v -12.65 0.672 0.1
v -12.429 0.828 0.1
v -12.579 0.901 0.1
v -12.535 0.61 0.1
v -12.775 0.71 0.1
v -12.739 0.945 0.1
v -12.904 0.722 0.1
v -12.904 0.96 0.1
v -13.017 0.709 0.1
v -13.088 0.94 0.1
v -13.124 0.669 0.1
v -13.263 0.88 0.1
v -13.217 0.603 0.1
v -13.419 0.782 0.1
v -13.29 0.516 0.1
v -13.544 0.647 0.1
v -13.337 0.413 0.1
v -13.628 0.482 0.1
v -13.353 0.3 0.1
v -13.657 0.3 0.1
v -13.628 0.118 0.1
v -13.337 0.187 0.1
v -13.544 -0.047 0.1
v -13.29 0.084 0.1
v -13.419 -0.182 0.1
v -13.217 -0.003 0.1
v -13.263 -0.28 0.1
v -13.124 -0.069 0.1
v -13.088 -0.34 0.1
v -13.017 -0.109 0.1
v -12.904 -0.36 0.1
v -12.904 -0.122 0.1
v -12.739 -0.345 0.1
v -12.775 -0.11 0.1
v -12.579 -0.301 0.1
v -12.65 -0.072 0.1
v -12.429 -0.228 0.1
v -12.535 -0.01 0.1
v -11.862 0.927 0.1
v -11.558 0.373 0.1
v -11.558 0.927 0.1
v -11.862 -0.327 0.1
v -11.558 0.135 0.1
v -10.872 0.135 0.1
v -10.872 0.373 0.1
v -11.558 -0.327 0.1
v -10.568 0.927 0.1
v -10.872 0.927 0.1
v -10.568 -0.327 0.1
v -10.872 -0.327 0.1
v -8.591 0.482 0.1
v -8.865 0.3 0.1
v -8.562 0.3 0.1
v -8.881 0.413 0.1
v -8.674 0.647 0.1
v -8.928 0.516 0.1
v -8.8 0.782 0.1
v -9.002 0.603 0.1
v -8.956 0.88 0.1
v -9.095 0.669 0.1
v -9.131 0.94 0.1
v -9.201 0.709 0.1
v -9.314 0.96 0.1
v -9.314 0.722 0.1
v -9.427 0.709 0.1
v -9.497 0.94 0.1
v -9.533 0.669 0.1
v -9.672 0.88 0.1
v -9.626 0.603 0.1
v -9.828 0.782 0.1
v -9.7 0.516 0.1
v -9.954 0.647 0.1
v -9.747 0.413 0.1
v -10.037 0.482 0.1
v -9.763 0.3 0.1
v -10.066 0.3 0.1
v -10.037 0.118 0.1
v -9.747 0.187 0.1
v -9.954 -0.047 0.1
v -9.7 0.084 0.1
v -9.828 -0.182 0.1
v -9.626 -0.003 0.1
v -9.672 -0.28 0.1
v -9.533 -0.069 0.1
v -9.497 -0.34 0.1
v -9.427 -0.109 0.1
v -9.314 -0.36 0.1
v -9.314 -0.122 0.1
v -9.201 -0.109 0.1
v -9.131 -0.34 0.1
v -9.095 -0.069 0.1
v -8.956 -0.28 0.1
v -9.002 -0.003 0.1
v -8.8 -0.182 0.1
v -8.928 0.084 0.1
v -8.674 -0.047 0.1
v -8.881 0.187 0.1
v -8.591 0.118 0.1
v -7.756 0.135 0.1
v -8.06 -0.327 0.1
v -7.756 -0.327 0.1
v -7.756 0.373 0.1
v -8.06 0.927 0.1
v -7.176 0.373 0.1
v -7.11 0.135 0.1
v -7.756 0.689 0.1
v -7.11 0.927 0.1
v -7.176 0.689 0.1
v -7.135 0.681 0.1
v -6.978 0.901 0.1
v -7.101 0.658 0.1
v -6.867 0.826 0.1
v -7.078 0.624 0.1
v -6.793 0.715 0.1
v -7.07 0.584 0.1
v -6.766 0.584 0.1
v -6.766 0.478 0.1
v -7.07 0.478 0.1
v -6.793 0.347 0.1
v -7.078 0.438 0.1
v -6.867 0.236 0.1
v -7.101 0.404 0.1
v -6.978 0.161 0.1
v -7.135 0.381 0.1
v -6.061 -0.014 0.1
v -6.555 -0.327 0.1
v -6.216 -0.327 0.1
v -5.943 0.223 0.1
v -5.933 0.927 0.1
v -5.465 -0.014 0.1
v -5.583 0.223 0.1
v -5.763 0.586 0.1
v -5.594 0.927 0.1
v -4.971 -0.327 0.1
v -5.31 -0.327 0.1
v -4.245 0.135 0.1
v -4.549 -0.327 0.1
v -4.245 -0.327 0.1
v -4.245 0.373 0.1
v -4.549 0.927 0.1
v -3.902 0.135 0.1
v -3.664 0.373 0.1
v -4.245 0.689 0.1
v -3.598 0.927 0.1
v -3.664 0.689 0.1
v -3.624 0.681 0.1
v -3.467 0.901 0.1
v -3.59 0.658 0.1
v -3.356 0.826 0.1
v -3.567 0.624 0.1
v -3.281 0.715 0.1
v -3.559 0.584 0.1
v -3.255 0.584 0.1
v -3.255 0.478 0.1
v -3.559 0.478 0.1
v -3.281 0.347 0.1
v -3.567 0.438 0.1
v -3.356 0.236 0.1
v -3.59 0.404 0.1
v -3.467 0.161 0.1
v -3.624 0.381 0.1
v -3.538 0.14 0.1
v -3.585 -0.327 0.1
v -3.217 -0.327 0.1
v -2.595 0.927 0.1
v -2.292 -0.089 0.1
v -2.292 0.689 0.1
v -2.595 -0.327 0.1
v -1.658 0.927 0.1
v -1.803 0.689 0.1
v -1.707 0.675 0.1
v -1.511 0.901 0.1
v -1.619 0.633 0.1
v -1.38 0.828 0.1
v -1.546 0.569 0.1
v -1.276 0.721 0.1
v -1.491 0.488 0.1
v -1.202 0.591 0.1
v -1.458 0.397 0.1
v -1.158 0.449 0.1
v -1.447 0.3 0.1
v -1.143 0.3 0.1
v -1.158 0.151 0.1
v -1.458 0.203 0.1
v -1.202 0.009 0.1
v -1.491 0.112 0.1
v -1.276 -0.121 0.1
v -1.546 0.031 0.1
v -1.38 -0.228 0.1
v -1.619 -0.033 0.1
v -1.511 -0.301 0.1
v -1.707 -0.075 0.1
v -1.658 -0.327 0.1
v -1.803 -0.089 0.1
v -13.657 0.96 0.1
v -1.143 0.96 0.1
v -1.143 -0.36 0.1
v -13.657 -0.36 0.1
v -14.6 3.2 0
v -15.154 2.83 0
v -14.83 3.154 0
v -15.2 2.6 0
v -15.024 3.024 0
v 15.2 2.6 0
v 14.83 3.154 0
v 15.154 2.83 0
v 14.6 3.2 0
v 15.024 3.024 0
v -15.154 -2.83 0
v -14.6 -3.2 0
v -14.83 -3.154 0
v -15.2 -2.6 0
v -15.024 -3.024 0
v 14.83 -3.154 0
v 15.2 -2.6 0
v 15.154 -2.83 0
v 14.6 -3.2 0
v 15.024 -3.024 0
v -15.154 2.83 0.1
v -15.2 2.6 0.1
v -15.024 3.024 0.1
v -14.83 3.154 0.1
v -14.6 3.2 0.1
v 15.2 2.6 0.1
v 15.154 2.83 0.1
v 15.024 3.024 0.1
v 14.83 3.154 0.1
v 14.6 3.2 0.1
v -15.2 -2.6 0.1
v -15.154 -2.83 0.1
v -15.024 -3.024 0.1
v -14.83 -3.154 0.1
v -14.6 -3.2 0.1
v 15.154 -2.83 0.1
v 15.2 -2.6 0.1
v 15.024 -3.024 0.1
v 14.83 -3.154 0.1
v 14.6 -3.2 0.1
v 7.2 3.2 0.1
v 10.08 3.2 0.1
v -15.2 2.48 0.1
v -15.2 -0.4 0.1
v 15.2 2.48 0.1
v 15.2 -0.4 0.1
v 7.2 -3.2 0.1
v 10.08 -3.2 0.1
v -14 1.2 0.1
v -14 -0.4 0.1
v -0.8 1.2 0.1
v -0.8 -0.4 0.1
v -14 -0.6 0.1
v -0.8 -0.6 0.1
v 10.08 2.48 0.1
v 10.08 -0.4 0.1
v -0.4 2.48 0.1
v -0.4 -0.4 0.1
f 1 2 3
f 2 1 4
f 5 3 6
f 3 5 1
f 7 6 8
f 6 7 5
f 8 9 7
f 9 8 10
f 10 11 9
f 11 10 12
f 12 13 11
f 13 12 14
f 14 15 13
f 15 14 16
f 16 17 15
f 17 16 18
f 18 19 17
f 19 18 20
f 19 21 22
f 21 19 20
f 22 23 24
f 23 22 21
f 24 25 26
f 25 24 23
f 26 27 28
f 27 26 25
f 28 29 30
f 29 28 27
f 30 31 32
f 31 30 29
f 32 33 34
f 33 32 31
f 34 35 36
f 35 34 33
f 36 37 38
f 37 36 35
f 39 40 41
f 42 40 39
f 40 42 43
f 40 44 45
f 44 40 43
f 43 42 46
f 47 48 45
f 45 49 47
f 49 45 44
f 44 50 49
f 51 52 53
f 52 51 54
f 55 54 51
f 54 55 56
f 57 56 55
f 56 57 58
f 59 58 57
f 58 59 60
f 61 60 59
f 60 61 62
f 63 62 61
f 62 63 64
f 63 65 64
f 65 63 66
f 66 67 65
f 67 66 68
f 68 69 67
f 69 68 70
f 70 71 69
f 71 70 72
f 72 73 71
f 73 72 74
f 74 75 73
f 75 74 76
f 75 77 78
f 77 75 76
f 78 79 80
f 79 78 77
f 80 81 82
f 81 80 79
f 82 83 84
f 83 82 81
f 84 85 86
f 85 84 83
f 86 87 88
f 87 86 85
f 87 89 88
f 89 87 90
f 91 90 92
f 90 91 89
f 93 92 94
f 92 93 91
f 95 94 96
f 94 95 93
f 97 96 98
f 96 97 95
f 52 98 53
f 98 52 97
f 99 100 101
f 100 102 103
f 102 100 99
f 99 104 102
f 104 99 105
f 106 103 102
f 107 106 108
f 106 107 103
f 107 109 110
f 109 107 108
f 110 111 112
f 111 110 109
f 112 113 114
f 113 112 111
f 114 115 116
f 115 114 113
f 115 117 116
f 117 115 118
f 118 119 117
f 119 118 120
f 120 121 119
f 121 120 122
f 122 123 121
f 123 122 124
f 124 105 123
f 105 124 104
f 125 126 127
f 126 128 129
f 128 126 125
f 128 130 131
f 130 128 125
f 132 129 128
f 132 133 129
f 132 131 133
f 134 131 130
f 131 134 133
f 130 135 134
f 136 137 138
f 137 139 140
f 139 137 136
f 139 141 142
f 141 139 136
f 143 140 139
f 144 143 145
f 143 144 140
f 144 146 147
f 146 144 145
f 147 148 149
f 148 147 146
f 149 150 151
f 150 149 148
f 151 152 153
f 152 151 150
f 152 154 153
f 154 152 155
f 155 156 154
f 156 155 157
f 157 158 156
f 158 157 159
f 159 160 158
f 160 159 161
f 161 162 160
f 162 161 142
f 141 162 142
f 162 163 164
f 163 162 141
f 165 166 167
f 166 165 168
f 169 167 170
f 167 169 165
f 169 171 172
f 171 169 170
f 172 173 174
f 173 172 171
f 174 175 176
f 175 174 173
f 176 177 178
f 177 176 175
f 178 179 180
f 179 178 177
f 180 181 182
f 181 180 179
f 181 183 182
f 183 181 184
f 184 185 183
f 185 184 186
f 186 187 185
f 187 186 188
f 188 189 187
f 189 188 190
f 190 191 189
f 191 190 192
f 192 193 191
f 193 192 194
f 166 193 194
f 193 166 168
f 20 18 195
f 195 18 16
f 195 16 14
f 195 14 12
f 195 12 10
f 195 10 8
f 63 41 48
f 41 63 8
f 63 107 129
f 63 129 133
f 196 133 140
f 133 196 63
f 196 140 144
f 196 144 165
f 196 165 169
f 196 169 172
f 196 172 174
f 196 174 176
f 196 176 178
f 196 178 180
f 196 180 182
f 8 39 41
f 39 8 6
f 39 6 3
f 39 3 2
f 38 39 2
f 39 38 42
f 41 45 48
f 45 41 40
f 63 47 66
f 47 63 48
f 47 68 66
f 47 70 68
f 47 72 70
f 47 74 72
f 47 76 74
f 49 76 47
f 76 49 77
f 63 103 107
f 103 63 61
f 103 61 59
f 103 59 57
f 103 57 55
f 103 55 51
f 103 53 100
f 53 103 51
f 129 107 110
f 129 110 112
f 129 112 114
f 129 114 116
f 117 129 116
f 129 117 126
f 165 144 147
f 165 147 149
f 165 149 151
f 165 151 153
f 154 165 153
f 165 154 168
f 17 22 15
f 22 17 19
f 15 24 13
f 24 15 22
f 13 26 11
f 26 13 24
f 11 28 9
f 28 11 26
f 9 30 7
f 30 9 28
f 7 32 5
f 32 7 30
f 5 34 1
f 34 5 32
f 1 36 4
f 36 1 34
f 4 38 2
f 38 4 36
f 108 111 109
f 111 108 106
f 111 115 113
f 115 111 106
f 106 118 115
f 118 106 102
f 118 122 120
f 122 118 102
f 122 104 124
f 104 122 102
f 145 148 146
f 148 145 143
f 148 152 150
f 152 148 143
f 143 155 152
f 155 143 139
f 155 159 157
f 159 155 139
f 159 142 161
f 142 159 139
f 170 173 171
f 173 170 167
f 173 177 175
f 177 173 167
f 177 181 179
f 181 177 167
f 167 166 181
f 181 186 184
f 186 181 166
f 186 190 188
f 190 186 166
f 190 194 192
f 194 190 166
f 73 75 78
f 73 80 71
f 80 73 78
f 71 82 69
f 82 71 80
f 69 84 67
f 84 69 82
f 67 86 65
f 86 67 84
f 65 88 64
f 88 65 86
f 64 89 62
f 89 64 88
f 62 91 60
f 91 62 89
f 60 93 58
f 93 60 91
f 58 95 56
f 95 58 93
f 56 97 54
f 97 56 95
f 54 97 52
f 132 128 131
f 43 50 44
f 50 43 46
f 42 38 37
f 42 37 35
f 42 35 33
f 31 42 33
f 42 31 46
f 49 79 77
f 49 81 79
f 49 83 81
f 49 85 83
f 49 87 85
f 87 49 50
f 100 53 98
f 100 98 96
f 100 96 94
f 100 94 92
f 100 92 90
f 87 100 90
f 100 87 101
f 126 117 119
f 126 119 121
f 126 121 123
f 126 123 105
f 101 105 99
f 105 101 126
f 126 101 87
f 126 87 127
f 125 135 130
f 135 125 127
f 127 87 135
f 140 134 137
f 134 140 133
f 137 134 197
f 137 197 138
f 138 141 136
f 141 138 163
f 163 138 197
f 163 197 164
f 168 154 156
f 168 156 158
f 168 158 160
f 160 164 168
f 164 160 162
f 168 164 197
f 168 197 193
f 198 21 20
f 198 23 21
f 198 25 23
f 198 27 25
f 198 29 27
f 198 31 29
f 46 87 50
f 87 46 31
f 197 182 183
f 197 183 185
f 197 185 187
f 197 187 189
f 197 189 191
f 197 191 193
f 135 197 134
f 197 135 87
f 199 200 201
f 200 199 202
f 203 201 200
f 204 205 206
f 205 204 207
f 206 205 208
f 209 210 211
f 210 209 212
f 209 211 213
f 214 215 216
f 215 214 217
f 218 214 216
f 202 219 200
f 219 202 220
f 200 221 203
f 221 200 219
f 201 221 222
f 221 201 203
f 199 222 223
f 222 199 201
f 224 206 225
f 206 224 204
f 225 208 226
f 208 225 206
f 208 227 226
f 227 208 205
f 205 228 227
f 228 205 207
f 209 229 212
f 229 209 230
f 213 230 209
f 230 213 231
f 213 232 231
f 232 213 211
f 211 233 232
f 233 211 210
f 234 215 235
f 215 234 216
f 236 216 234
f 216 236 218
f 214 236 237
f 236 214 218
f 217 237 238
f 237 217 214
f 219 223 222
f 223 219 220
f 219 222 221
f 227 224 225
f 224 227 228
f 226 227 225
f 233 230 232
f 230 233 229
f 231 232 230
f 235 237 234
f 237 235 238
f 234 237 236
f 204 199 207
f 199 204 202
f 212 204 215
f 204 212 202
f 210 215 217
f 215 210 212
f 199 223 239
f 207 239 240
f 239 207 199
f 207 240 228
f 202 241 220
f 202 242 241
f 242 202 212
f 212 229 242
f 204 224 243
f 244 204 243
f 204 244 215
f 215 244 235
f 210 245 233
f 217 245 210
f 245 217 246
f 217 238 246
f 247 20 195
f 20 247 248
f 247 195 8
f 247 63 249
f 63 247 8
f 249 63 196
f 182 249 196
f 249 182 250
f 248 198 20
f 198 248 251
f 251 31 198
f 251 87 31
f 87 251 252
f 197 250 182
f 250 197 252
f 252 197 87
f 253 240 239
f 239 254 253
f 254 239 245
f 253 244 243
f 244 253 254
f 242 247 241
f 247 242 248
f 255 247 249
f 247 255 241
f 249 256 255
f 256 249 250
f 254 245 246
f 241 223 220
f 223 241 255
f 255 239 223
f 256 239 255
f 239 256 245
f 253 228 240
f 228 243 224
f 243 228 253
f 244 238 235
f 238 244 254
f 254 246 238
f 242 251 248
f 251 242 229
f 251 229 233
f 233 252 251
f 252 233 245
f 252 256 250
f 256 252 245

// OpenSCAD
// file: ../p/1-4cyli.scad
use <../lib.scad>
function ldraw_lib__1_4cyli() = [
// 0 Cylinder 0.25
// 0 Name: 1-4cyli.dat
// 0 Author: James Jessiman
// 0 !LDRAW_ORG Primitive UPDATE 2012-01
// 0 !LICENSE Licensed under CC BY 4.0 : see CAreadme.txt
// 
// 0 BFC CERTIFY CCW
  [0,"BFC","CERTIFY"],
  [0,"BFC","CCW"],
// 
// 0 !HISTORY 2002-03-23 [sbliss] Added BFC statement.
// 0 !HISTORY 2002-04-25 [PTadmin] Official Update 2002-02
// 0 !HISTORY 2007-06-22 [PTadmin] Header formatted for Contributor Agreement
// 0 !HISTORY 2008-07-01 [PTadmin] Official Update 2008-01
// 0 !HISTORY 2012-02-16 [Philo] Changed to CCW
// 0 !HISTORY 2012-03-30 [PTadmin] Official Update 2012-01
// 
// 
// 4 16 1 1 0 0.9239 1 0.3827 0.9239 0 0.3827 1 0 0
  [4,16,1,1,0,0.9239,1,0.3827,0.9239,0,0.3827,1,0,0],
// 5 24 1 0 0 1 1 0 0.9239 0 0.3827 1 0 -1
  [5,24,1,0,0,1,1,0,0.9239,0,0.3827,1,0,-1],
// 4 16 0.9239 1 0.3827 0.7071 1 0.7071 0.7071 0 0.7071 0.9239 0 0.3827
  [4,16,0.9239,1,0.3827,0.7071,1,0.7071,0.7071,0,0.7071,0.9239,0,0.3827],
// 5 24 0.9239 0 0.3827 0.9239 1 0.3827 0.7071 0 0.7071 1 0 0
  [5,24,0.9239,0,0.3827,0.9239,1,0.3827,0.7071,0,0.7071,1,0,0],
// 4 16 0.7071 1 0.7071 0.3827 1 0.9239 0.3827 0 0.9239 0.7071 0 0.7071
  [4,16,0.7071,1,0.7071,0.3827,1,0.9239,0.3827,0,0.9239,0.7071,0,0.7071],
// 5 24 0.7071 0 0.7071 0.7071 1 0.7071 0.3827 0 0.9239 0.9239 0 0.3827
  [5,24,0.7071,0,0.7071,0.7071,1,0.7071,0.3827,0,0.9239,0.9239,0,0.3827],
// 4 16 0.3827 1 0.9239 0 1 1 0 0 1 0.3827 0 0.9239
  [4,16,0.3827,1,0.9239,0,1,1,0,0,1,0.3827,0,0.9239],
// 5 24 0.3827 0 0.9239 0.3827 1 0.9239 0 0 1 0.7071 0 0.7071
  [5,24,0.3827,0,0.9239,0.3827,1,0.9239,0,0,1,0.7071,0,0.7071],
// 5 24 0 0 1 0 1 1 0.3827 0 0.9239 -1 0 1
  [5,24,0,0,1,0,1,1,0.3827,0,0.9239,-1,0,1],
];
module ldraw_lib__1_4cyli(step=0, col=false, unit=2/5, alt=false, line=0.2, solid=!$preview)
    makepoly(ldraw_lib__1_4cyli(), step=step, col=col, unit=unit, alt=alt, line=line, solid=solid);
ldraw_lib__1_4cyli(line=0.2);
// file: ../p/1-4chrd.scad
use <../lib.scad>
function ldraw_lib__1_4chrd() = [
// 0 Chord 0.25
// 0 Name: 1-4chrd.dat
// 0 Author: Max Martin Richter [MMR1988]
// 0 !LDRAW_ORG Primitive UPDATE 2023-05
// 0 !LICENSE Licensed under CC BY 4.0 : see CAreadme.txt
// 
// 0 BFC CERTIFY CCW
  [0,"BFC","CERTIFY"],
  [0,"BFC","CCW"],
// 
// 0 !HISTORY 2004-04-22 [PTadmin] Official Update 2004-02
// 0 !HISTORY 2007-10-09 [PTadmin] Header formatted for Contributor Agreement
// 0 !HISTORY 2008-07-01 [PTadmin] Official Update 2008-01
// 0 !HISTORY 2012-08-02 [MMR1988] Re-creation with PrimGen2 and Rectifier
// 0 !HISTORY 2012-08-09 [PTadmin] Official Update 2012-02
// 0 !HISTORY 2023-10-27 [OrionP] Change author to MMR1988 from hafhead
// 0 !HISTORY 2023-10-31 [OrionP] Official Update 2023-05
// 
// 4 16 0.9239 0 0.3827 0.3827 0 0.9239 0 0 1 1 0 0
  [4,16,0.9239,0,0.3827,0.3827,0,0.9239,0,0,1,1,0,0],
// 3 16 0.7071 0 0.7071 0.3827 0 0.9239 0.9239 0 0.3827
  [3,16,0.7071,0,0.7071,0.3827,0,0.9239,0.9239,0,0.3827],
];
module ldraw_lib__1_4chrd(step=0, col=false, unit=2/5, alt=false, line=0.2, solid=!$preview)
    makepoly(ldraw_lib__1_4chrd(), step=step, col=col, unit=unit, alt=alt, line=line, solid=solid);
ldraw_lib__1_4chrd(line=0.2);
// main file
use <../lib.scad>
use <../p/1-4chrd.scad>
use <../p/1-4cyli.scad>
use <../p/logo-chopard-box.scad>
use <../p/logo-chopard-text.scad>
function ldraw_lib__6148328ax() = [
// 0 Sticker  0.8 x  3.8 with White "CHOPARD" and Dark Grey Lines on White Background Left
// 0 Name: 6148328ax.dat
// 0 Author: Massimo Maso [Sirio]
// 0 !LDRAW_ORG Part UPDATE 2024-08
// 0 !LICENSE Licensed under CC BY 4.0 : see CAreadme.txt
// 
// 0 BFC CERTIFY CCW
  [0,"BFC","CERTIFY"],
  [0,"BFC","CCW"],
// 
// 0 !KEYWORDS 919, Bricklink 75876stk01, Brickowl 852010, Hybrid, Pit Lane
// 0 !KEYWORDS Porsche, Rebrickable 26357, set 75876, Speed Champions
// 
// 0 !HISTORY 2024-09-30 [OrionP] Official Update 2024-08
// 
// 0 // Logo primitives
// 1 15 -18.5 -.25 .75 .33 0 0 0 1 0 0 0 .33 logo-chopard-text.dat
  [1,15,-18.5,-.25,.75,.33,0,0,0,1,0,0,0,.33, ldraw_lib__logo_chopard_text()],
// 1 0 -18.5 -.25 .75 .33 0 0 0 1 0 0 0 .33 logo-chopard-box.dat
  [1,0,-18.5,-.25,.75,.33,0,0,0,1,0,0,0,.33, ldraw_lib__logo_chopard_box()],
// 0 // Primitives
// 1 16 -36.5 0 6.5 -1.5 0 0 0 -1 0 0 0 1.5 1-4chrd.dat
  [1,16,-36.5,0,6.5,-1.5,0,0,0,-1,0,0,0,1.5, ldraw_lib__1_4chrd()],
// 1 16 36.5 0 6.5 1.5 0 0 0 -1 0 0 0 1.5 1-4chrd.dat
  [1,16,36.5,0,6.5,1.5,0,0,0,-1,0,0,0,1.5, ldraw_lib__1_4chrd()],
// 1 16 -36.5 0 -6.5 -1.5 0 0 0 -1 0 0 0 -1.5 1-4chrd.dat
  [1,16,-36.5,0,-6.5,-1.5,0,0,0,-1,0,0,0,-1.5, ldraw_lib__1_4chrd()],
// 1 16 36.5 0 -6.5 1.5 0 0 0 -1 0 0 0 -1.5 1-4chrd.dat
  [1,16,36.5,0,-6.5,1.5,0,0,0,-1,0,0,0,-1.5, ldraw_lib__1_4chrd()],
// 1 16 -36.5 0 6.5 -1.5 0 0 0 -.25 0 0 0 1.5 1-4cyli.dat
  [1,16,-36.5,0,6.5,-1.5,0,0,0,-.25,0,0,0,1.5, ldraw_lib__1_4cyli()],
// 1 16 36.5 0 6.5 1.5 0 0 0 -.25 0 0 0 1.5 1-4cyli.dat
  [1,16,36.5,0,6.5,1.5,0,0,0,-.25,0,0,0,1.5, ldraw_lib__1_4cyli()],
// 1 16 -36.5 0 -6.5 -1.5 0 0 0 -.25 0 0 0 -1.5 1-4cyli.dat
  [1,16,-36.5,0,-6.5,-1.5,0,0,0,-.25,0,0,0,-1.5, ldraw_lib__1_4cyli()],
// 1 16 36.5 0 -6.5 1.5 0 0 0 -.25 0 0 0 -1.5 1-4cyli.dat
  [1,16,36.5,0,-6.5,1.5,0,0,0,-.25,0,0,0,-1.5, ldraw_lib__1_4cyli()],
// 1 15 -36.5 -.25 6.5 -1.5 0 0 0 1 0 0 0 1.5 1-4chrd.dat
  [1,15,-36.5,-.25,6.5,-1.5,0,0,0,1,0,0,0,1.5, ldraw_lib__1_4chrd()],
// 1 15 36.5 -.25 6.5 1.5 0 0 0 1 0 0 0 1.5 1-4chrd.dat
  [1,15,36.5,-.25,6.5,1.5,0,0,0,1,0,0,0,1.5, ldraw_lib__1_4chrd()],
// 1 15 -36.5 -.25 -6.5 -1.5 0 0 0 1 0 0 0 -1.5 1-4chrd.dat
  [1,15,-36.5,-.25,-6.5,-1.5,0,0,0,1,0,0,0,-1.5, ldraw_lib__1_4chrd()],
// 1 15 36.5 -.25 -6.5 1.5 0 0 0 1 0 0 0 -1.5 1-4chrd.dat
  [1,15,36.5,-.25,-6.5,1.5,0,0,0,1,0,0,0,-1.5, ldraw_lib__1_4chrd()],
// 0 // Bottom faces
// 4 16 36.5 0 8 38 0 6.5 -38 0 6.5 -36.5 0 8
  [4,16,36.5,0,8,38,0,6.5,-38,0,6.5,-36.5,0,8],
// 4 16 38 0 6.5 38 0 -6.5 -38 0 -6.5 -38 0 6.5
  [4,16,38,0,6.5,38,0,-6.5,-38,0,-6.5,-38,0,6.5],
// 4 16 36.5 0 -8 -36.5 0 -8 -38 0 -6.5 38 0 -6.5
  [4,16,36.5,0,-8,-36.5,0,-8,-38,0,-6.5,38,0,-6.5],
// 0 // Lateral faces
// 3 16 -36.5 0 8 -36.5 -.25 8 18 -.25 8
  [3,16,-36.5,0,8,-36.5,-.25,8,18,-.25,8],
// 4 16 -36.5 0 8 18 -.25 8 25.2 -.25 8 36.5 0 8
  [4,16,-36.5,0,8,18,-.25,8,25.2,-.25,8,36.5,0,8],
// 3 16 36.5 0 8 25.2 -.25 8 36.5 -.25 8
  [3,16,36.5,0,8,25.2,-.25,8,36.5,-.25,8],
// 3 16 -38 0 6.5 -38 -.25 6.2 -38 -.25 6.5
  [3,16,-38,0,6.5,-38,-.25,6.2,-38,-.25,6.5],
// 4 16 -38 0 6.5 -38 0 -6.5 -38 -.25 -1 -38 -.25 6.2
  [4,16,-38,0,6.5,-38,0,-6.5,-38,-.25,-1,-38,-.25,6.2],
// 3 16 -38 0 -6.5 -38 -.25 -6.5 -38 -.25 -1
  [3,16,-38,0,-6.5,-38,-.25,-6.5,-38,-.25,-1],
// 3 16 38 0 6.5 38 -.25 6.5 38 -.25 6.2
  [3,16,38,0,6.5,38,-.25,6.5,38,-.25,6.2],
// 4 16 38 0 6.5 38 -.25 6.2 38 -.25 -1 38 0 -6.5
  [4,16,38,0,6.5,38,-.25,6.2,38,-.25,-1,38,0,-6.5],
// 3 16 38 0 -6.5 38 -.25 -1 38 -.25 -6.5
  [3,16,38,0,-6.5,38,-.25,-1,38,-.25,-6.5],
// 3 16 -36.5 0 -8 18 -.25 -8 -36.5 -.25 -8
  [3,16,-36.5,0,-8,18,-.25,-8,-36.5,-.25,-8],
// 4 16 -36.5 0 -8 36.5 0 -8 25.2 -.25 -8 18 -.25 -8
  [4,16,-36.5,0,-8,36.5,0,-8,25.2,-.25,-8,18,-.25,-8],
// 3 16 36.5 0 -8 36.5 -.25 -8 25.2 -.25 -8
  [3,16,36.5,0,-8,36.5,-.25,-8,25.2,-.25,-8],
// 0 // Top faces
// 0 // Black frame
// 4 0 -35 -.25 3 -35 -.25 -1 -34.142 -.25 .75 -34.142 -.25 2.4
  [4,0,-35,-.25,3,-35,-.25,-1,-34.142,-.25,.75,-34.142,-.25,2.4],
// 3 0 -35 -.25 3 -34.142 -.25 2.4 -32.261 -.25 2.4
  [3,0,-35,-.25,3,-34.142,-.25,2.4,-32.261,-.25,2.4],
// 4 0 -35 -.25 3 -32.261 -.25 2.4 -23.285 -.25 2.4 -2 -.25 3
  [4,0,-35,-.25,3,-32.261,-.25,2.4,-23.285,-.25,2.4,-2,-.25,3],
// 3 0 -2 -.25 3 -23.285 -.25 2.4 -2.858 -.25 2.4
  [3,0,-2,-.25,3,-23.285,-.25,2.4,-2.858,-.25,2.4],
// 4 0 -2 -.25 3 -2.858 -.25 2.4 -2.858 -.25 .75 -2 -.25 -1
  [4,0,-2,-.25,3,-2.858,-.25,2.4,-2.858,-.25,.75,-2,-.25,-1],
// 4 0 -35 -.25 -1.5 -34.142 -.25 -.9 -34.142 -.25 .75 -35 -.25 -1
  [4,0,-35,-.25,-1.5,-34.142,-.25,-.9,-34.142,-.25,.75,-35,-.25,-1],
// 3 0 -35 -.25 -1.5 -32.261 -.25 -.9 -34.142 -.25 -.9
  [3,0,-35,-.25,-1.5,-32.261,-.25,-.9,-34.142,-.25,-.9],
// 4 0 -35 -.25 -1.5 -2 -.25 -1.5 -23.285 -.25 -.9 -32.261 -.25 -.9
  [4,0,-35,-.25,-1.5,-2,-.25,-1.5,-23.285,-.25,-.9,-32.261,-.25,-.9],
// 4 0 -2 -.25 -1.5 -2 -.25 -1 -2.858 -.25 .75 -2.858 -.25 -.9
  [4,0,-2,-.25,-1.5,-2,-.25,-1,-2.858,-.25,.75,-2.858,-.25,-.9],
// 3 0 -2 -.25 -1.5 -2.858 -.25 -.9 -23.285 -.25 -.9
  [3,0,-2,-.25,-1.5,-2.858,-.25,-.9,-23.285,-.25,-.9],
// 0 // Dark grey faces
// 3 72 25.2 -.25 6.2 25.2 -.25 8 18 -.25 8
  [3,72,25.2,-.25,6.2,25.2,-.25,8,18,-.25,8],
// 4 72 25.2 -.25 6.2 18 -.25 8 18 -.25 -8 25.2 -.25 -1
  [4,72,25.2,-.25,6.2,18,-.25,8,18,-.25,-8,25.2,-.25,-1],
// 4 72 25.2 -.25 6.2 25.2 -.25 -1 38 -.25 -1 38 -.25 6.2
  [4,72,25.2,-.25,6.2,25.2,-.25,-1,38,-.25,-1,38,-.25,6.2],
// 4 72 -35 -.25 3 -38 -.25 6.2 -38 -.25 -1 -35 -.25 -1
  [4,72,-35,-.25,3,-38,-.25,6.2,-38,-.25,-1,-35,-.25,-1],
// 4 72 -35 -.25 3 -2 -.25 3 -1 -.25 6.2 -38 -.25 6.2
  [4,72,-35,-.25,3,-2,-.25,3,-1,-.25,6.2,-38,-.25,6.2],
// 4 72 -2 -.25 3 -2 -.25 -1 -1 -.25 -1 -1 -.25 6.2
  [4,72,-2,-.25,3,-2,-.25,-1,-1,-.25,-1,-1,-.25,6.2],
// 3 72 25.2 -.25 -1 18 -.25 -8 25.2 -.25 -8
  [3,72,25.2,-.25,-1,18,-.25,-8,25.2,-.25,-8],
// 0 // White faces
// 4 15 -1 -.25 6.2 -36.5 -.25 8 -38 -.25 6.5 -38 -.25 6.2
  [4,15,-1,-.25,6.2,-36.5,-.25,8,-38,-.25,6.5,-38,-.25,6.2],
// 3 15 -1 -.25 6.2 18 -.25 8 -36.5 -.25 8
  [3,15,-1,-.25,6.2,18,-.25,8,-36.5,-.25,8],
// 4 15 -1 -.25 6.2 -1 -.25 -1 18 -.25 -8 18 -.25 8
  [4,15,-1,-.25,6.2,-1,-.25,-1,18,-.25,-8,18,-.25,8],
// 3 15 25.2 -.25 6.2 36.5 -.25 8 25.2 -.25 8
  [3,15,25.2,-.25,6.2,36.5,-.25,8,25.2,-.25,8],
// 4 15 25.2 -.25 6.2 38 -.25 6.2 38 -.25 6.5 36.5 -.25 8
  [4,15,25.2,-.25,6.2,38,-.25,6.2,38,-.25,6.5,36.5,-.25,8],
// 4 15 25.2 -.25 -1 36.5 -.25 -8 38 -.25 -6.5 38 -.25 -1
  [4,15,25.2,-.25,-1,36.5,-.25,-8,38,-.25,-6.5,38,-.25,-1],
// 3 15 25.2 -.25 -1 25.2 -.25 -8 36.5 -.25 -8
  [3,15,25.2,-.25,-1,25.2,-.25,-8,36.5,-.25,-8],
// 4 15 -35 -.25 -1.5 -35 -.25 -1 -38 -.25 -1 -38 -.25 -6.5
  [4,15,-35,-.25,-1.5,-35,-.25,-1,-38,-.25,-1,-38,-.25,-6.5],
// 3 15 -35 -.25 -1.5 -38 -.25 -6.5 -36.5 -.25 -8
  [3,15,-35,-.25,-1.5,-38,-.25,-6.5,-36.5,-.25,-8],
// 4 15 -2 -.25 -1.5 -35 -.25 -1.5 -36.5 -.25 -8 18 -.25 -8
  [4,15,-2,-.25,-1.5,-35,-.25,-1.5,-36.5,-.25,-8,18,-.25,-8],
// 4 15 -2 -.25 -1.5 18 -.25 -8 -1 -.25 -1 -2 -.25 -1
  [4,15,-2,-.25,-1.5,18,-.25,-8,-1,-.25,-1,-2,-.25,-1],
];
module ldraw_lib__6148328ax(step=0, col=false, unit=2/5, alt=false, line=0.2, solid=!$preview)
    makepoly(ldraw_lib__6148328ax(), step=step, col=col, unit=unit, alt=alt, line=line, solid=solid);
ldraw_lib__6148328ax(line=0.2);
